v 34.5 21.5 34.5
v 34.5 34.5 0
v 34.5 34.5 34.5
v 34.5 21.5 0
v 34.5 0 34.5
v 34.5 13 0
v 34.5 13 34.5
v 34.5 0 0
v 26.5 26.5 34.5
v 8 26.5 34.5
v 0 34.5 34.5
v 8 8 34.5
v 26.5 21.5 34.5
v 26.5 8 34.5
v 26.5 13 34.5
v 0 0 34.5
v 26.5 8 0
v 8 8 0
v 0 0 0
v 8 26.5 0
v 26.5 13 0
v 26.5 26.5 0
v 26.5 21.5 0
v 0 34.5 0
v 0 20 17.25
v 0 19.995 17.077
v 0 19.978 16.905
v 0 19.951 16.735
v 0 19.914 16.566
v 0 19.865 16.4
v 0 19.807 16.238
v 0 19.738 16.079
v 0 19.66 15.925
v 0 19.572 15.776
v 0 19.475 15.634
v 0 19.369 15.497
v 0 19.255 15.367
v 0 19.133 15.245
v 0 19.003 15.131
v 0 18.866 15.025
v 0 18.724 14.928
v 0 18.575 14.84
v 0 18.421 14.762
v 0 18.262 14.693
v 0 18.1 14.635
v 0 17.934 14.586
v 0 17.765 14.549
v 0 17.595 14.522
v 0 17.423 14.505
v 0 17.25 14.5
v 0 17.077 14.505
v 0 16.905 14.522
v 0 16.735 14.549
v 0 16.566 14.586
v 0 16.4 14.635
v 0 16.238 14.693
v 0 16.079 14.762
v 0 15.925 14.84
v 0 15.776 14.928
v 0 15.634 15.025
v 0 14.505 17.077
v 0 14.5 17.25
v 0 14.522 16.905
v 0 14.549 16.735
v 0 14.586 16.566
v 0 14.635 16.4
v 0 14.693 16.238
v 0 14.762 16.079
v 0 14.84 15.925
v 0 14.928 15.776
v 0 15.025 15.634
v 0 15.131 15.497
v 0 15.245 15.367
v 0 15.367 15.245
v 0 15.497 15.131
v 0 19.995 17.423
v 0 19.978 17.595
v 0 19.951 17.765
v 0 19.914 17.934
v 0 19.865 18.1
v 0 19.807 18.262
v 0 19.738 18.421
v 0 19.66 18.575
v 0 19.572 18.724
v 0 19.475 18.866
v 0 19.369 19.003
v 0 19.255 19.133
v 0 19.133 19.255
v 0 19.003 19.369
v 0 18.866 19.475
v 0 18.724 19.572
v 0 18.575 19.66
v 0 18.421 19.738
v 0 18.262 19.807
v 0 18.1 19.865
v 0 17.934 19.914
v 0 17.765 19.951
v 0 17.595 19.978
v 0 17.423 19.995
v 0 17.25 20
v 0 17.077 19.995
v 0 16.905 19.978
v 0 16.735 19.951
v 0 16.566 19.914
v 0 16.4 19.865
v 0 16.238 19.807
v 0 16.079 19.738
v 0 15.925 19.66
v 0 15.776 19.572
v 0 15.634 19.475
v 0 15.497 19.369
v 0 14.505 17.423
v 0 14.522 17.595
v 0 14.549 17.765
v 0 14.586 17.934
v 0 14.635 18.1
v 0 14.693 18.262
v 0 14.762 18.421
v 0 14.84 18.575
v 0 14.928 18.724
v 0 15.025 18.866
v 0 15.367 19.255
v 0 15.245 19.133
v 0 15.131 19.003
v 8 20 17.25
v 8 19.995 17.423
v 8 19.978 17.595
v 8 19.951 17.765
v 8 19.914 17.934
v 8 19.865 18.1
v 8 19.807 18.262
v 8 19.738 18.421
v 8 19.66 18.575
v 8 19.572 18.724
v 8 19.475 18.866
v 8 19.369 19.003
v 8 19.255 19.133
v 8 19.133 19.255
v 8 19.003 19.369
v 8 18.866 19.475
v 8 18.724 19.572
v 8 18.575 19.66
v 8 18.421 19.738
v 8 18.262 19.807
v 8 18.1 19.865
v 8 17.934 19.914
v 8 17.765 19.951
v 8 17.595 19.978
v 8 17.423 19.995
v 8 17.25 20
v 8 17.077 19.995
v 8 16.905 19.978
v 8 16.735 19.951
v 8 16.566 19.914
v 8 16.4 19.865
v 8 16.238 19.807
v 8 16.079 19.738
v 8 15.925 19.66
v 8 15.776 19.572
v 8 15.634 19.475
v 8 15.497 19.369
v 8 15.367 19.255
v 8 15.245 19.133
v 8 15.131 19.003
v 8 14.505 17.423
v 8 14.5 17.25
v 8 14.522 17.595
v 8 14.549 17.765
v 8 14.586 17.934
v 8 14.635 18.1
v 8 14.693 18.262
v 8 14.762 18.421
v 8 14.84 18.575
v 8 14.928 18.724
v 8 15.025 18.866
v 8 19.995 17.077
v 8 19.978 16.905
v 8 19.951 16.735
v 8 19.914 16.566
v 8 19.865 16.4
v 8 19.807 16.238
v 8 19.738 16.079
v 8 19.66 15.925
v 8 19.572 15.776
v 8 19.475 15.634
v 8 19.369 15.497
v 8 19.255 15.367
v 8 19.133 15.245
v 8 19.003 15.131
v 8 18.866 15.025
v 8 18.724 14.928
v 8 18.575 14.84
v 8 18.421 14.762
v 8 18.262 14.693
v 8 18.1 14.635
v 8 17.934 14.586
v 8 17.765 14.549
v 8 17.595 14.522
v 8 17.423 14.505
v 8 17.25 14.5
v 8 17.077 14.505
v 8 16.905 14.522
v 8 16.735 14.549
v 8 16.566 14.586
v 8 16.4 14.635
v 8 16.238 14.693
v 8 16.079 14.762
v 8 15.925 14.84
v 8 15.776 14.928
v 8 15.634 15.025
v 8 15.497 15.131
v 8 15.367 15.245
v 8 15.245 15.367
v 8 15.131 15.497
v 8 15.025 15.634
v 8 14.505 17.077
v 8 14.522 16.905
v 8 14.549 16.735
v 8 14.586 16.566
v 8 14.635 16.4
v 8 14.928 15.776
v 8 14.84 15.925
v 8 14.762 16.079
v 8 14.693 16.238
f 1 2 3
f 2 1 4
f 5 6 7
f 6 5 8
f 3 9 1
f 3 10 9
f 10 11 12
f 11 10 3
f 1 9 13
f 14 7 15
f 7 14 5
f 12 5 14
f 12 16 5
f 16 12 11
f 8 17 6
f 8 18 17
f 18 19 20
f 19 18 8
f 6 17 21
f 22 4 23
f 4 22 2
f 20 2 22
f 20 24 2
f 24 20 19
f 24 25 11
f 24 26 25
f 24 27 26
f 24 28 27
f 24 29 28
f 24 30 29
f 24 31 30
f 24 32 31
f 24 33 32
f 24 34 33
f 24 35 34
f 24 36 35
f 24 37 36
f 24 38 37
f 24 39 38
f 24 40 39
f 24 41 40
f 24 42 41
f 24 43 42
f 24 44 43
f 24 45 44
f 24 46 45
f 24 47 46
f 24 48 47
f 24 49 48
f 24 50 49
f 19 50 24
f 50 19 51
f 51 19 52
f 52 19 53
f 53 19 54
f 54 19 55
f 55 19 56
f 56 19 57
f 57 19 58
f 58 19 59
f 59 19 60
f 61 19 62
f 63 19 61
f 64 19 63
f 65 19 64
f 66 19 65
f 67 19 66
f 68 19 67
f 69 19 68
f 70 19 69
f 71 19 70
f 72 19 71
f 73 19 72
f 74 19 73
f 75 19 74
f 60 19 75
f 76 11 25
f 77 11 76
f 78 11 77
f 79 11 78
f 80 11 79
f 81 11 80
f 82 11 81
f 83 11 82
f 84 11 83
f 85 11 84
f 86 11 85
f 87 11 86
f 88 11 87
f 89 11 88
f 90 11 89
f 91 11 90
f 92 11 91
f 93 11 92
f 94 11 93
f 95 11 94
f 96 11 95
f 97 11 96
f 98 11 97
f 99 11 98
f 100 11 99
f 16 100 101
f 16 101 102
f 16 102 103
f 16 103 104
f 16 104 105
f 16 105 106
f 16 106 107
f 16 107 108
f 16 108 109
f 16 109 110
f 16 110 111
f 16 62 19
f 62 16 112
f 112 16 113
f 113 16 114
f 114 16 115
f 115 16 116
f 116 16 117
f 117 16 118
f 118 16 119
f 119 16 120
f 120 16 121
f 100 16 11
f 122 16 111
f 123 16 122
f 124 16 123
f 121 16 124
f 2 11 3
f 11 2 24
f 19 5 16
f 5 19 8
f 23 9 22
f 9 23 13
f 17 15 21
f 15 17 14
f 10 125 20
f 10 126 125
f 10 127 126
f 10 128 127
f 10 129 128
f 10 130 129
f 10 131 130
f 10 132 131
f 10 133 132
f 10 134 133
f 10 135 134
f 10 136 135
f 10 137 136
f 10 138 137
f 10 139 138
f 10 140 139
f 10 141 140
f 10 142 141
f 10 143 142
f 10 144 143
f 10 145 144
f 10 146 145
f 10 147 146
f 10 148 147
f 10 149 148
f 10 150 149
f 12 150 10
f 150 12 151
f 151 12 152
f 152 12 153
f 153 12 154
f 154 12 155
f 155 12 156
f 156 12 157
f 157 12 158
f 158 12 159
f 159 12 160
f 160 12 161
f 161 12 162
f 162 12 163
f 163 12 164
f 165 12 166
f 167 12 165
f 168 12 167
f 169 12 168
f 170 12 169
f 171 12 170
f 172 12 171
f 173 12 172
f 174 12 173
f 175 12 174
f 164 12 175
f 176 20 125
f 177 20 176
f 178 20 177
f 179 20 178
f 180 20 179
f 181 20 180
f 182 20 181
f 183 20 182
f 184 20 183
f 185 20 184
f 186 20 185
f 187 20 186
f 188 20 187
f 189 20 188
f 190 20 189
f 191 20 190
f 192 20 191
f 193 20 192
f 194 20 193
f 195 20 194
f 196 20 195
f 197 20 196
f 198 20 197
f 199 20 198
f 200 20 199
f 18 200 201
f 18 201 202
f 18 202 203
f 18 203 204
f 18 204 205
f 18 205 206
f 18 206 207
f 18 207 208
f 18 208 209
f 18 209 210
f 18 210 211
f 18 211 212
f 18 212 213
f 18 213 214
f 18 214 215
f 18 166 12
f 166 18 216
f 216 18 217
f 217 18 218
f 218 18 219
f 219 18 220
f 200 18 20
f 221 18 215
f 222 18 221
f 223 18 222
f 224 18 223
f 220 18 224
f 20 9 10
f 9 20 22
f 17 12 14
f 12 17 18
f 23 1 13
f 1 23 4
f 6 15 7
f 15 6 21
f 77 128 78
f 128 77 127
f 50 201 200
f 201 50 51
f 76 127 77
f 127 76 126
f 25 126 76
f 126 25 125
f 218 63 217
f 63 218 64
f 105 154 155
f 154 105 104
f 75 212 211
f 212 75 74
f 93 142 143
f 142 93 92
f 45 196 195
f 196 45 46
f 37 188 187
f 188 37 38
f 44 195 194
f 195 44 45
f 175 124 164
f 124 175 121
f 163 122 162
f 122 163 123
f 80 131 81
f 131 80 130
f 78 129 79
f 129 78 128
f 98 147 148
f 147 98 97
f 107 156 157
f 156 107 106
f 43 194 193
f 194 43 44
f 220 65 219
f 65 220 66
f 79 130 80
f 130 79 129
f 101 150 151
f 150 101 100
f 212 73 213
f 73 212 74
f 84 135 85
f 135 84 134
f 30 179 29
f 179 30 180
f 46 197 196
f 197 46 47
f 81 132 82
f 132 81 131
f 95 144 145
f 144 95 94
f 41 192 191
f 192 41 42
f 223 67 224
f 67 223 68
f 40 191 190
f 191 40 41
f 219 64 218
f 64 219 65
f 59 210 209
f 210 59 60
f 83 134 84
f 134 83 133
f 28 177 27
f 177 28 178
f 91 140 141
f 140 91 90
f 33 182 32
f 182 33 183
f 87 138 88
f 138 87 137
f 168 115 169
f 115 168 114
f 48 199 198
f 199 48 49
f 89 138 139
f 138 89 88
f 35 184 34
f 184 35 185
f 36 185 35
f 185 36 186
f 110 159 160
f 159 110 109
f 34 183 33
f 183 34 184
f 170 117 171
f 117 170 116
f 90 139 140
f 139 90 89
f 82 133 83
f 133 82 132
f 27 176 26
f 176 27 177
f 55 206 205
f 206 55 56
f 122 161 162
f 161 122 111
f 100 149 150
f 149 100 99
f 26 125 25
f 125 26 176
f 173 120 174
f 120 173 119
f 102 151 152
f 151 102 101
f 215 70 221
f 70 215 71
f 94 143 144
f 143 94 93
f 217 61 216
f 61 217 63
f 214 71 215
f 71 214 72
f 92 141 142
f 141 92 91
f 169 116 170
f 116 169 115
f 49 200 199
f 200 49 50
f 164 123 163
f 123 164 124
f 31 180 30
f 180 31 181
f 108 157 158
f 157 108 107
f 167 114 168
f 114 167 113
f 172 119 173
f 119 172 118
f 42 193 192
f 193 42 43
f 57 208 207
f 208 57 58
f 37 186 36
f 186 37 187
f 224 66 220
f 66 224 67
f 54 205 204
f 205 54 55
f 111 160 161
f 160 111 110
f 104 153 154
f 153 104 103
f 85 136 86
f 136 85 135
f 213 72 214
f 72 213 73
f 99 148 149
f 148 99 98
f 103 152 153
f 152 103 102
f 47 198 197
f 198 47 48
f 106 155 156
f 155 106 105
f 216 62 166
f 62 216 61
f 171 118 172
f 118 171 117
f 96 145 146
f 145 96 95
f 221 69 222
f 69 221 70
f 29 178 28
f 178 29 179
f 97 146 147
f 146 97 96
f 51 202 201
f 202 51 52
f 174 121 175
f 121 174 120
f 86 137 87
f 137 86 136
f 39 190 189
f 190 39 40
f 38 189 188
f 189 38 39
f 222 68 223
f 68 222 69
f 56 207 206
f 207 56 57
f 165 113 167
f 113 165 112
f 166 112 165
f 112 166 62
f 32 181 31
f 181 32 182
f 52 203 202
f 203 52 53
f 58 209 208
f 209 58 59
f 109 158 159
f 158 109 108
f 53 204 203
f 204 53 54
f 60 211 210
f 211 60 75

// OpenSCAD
Width = 18.50;
Length = Width;
Height = Width;
WallThickness = 8.0; //Changed for SpacerJig()

function OuterWidth(w) = AddWall(w);
function OuterLength(l) = AddWall(l);
function OuterHeight(h) = AddWall(h);
function AddWall(length) = length + (2*WallThickness);
function Middle(length) = length/2;


module squareTube(innerWidth, innerDepth, innerHeight, wallThickness)
{
    difference()
    {
    echo(OuterWidth(innerWidth), OuterLength(innerDepth), OuterHeight(innerHeight));
    cube([OuterWidth(innerWidth), OuterLength(innerDepth), OuterHeight(innerHeight)], false);
    translate([wallThickness,wallThickness,-1])
        cube([innerWidth, innerDepth, OuterHeight(innerHeight)+2], false);
    }
}

module angleBracket()
{
        //do the final placement so it does not have to be adjusted everytime in Cura.
    translate([0,0,2*OuterHeight(Height)])
    rotate([0,180,0])
    difference()
    {
        union()
        {    
            translate([OuterWidth(Width),0,2*OuterHeight(Height)])
            rotate([0,90,0])
            squareTube(Width,Length,Height,WallThickness);
            squareTube(Width,Length,2*Height+AddWall(0),WallThickness);
        }
//this is a hack, but need to get it done quickly.        
//remove the top of the bracket so wood can be placed in after otherside is attached.
    translate([OuterWidth(Width),WallThickness,OuterHeight(Height)-0.5])
        {
        cube([OuterWidth(Width)+1, Length, WallThickness+1], false);
        }
    }
}

module BracketWithGrove()
{
        difference()
    {
    angleBracket();
        echo(-Middle(SpacerHeight),Middle(AddWall(Width))-Middle(SpacerWidth+2.0),-1);
        translate([-WallThickness-1,Middle(AddWall(Width))-Middle(SpacerWidth+2.0),-1])
        rotate([0,0,90])
        rotate([90,0,0])
        spacer(SpacerWidth+2.0, Grovelength+2,SpacerHeight);
//        cube([SpacerWidth+2.0, Grovelength+2,SpacerHeight]);
    echo(SpacerWidth+2.0, Grovelength+2,SpacerHeight);
//        translate([-AddWall(0)+1,-1.8,-5])
//        rotate([0,45,90])
//        rotate([90,0,0])
//        cube([Width,Length,AddWall(0)]);
//        
//        translate([-AddWall(0)+1,-1.8,Grovelength+5])
//        rotate([0,45,90])
//        rotate([90,0,0])
//        cube([Width,Length,AddWall(0)]);
    }

    //add a spacer for each bracket.
//    translate([0,7.5,0])rotate([0,0,90])attachmentSpacer();
}


ScrewDiameter=3.5;
SpacerWidth= 7.5; //AddWall(ScrewDiameter); //Changed for SpacerJig()
SpacerLength=Length;
SpacerHeight=WallThickness+2;
Grovelength=2*AddWall(Length);

module attachmentSpacer()
{
    difference()
    {

         spacer(SpacerWidth, SpacerLength,SpacerHeight);
        
        translate([Middle(SpacerWidth), Middle(Length)],0)
            cylinder($fn=100,h=SpacerHeight,d1=ScrewDiameter,d2=ScrewDiameter,center=false);
    }
    
}

module spacer(spacerWidth, spacerLength,spacerHeight)
{
         cube([spacerWidth, spacerLength,spacerHeight]);
}

module CeilingBracket()
{
    difference()
    {
    union()
    {
    squareTube(Width,Length,Height+AddWall(0),WallThickness);
        translate([-AddWall(Width),0,0]) cube([3*AddWall(Width),AddWall(Length),2*WallThickness]);
        
        translate([-AddWall(Width),WallThickness,2*WallThickness])
        rotate([90,0,0])
        cube([AddWall(Width),AddWall(Length),WallThickness]);
        
        translate([-AddWall(Width),AddWall(Width),2*WallThickness])
        rotate([90,0,0])
        cube([AddWall(Width),AddWall(Length),WallThickness]);

        translate([AddWall(Width),WallThickness,2*WallThickness])
        rotate([90,0,0])
        cube([AddWall(Width),AddWall(Length),WallThickness]);
        
        translate([AddWall(Width),AddWall(Width),2*WallThickness])
        rotate([90,0,0])
        cube([AddWall(Width),AddWall(Length),WallThickness]);
    }
    translate([-Middle(AddWall(Width)),Middle(AddWall(Length)),-1]) 
    cylinder($fn=100,h=SpacerHeight,d1=ScrewDiameter,d2=ScrewDiameter,center=false);
    
    translate([Middle(AddWall(Width)),Middle(AddWall(Length)),-1]) 
    cylinder($fn=100,h=SpacerHeight,d1=ScrewDiameter,d2=ScrewDiameter,center=false);
    
    translate([Middle(3*AddWall(Width)),Middle(AddWall(Length)),-1]) 
    cylinder($fn=100,h=SpacerHeight,d1=ScrewDiameter,d2=ScrewDiameter,center=false);
    
    translate([-AddWall(Width),WallThickness+1,4]) 
    rotate([0,-45,0])
    rotate([90,0,0])
    cube([2*AddWall(Width),2*AddWall(Length),2*WallThickness]);
    
    translate([-AddWall(Width),AddWall(Length)+1,4]) 
    rotate([0,-45,0])
    rotate([90,0,0])
    cube([2*AddWall(Width),2*AddWall(Length),2*WallThickness]);
    
    translate([2*AddWall(Width),WallThickness+1,4]) 
    rotate([0,-45,0])
    rotate([90,0,0])
    cube([2*AddWall(Width),2*AddWall(Length),2*WallThickness]);
    
    translate([2*AddWall(Width),AddWall(Length)+1,4]) 
    rotate([0,-45,0])
    rotate([90,0,0])
    cube([2*AddWall(Width),2*AddWall(Length),2*WallThickness]);
}
    
}

module SpacerJig()
{
    difference()
    {
        squareTube(Width,Length,Height,WallThickness);
        translate([AddWall(Width)-WallThickness-1,Middle(AddWall(Width))-Middle(SpacerWidth+1.0),-1])
        rotate([0,0,90])
        rotate([90,0,0])
        spacer(SpacerWidth+1.0, Grovelength+2,SpacerHeight);
        
        translate([-1,Middle(AddWall(Length)),Middle(AddWall(Height))]) 
        rotate([0,0,90])
        rotate([90,0,0])
        cylinder($fn=100,h=2*WallThickness,d1=ScrewDiameter+2,d2=ScrewDiameter+2,center=false);
    }
}

Rows = 1;
Columns = 1;

module main()
{
    for(x=[1:Rows], y=[1:Columns])
    {
        SpacerJig();
//        translate([(Grovelength+5)*x,(SpacerLength+7)*y,0]) angleBracket();
//    translate([(Grovelength+5)*x,(SpacerLength+7)*y,0])BracketWithGrove();
//    translate([(SpacerWidth+5)*x,(SpacerLength+5)*y,0])attachmentSpacer();
//        translate([(AddWall(Width)*3+1)*x,(SpacerLength+6)*y,0]) CeilingBracket();
    }
}


main();
